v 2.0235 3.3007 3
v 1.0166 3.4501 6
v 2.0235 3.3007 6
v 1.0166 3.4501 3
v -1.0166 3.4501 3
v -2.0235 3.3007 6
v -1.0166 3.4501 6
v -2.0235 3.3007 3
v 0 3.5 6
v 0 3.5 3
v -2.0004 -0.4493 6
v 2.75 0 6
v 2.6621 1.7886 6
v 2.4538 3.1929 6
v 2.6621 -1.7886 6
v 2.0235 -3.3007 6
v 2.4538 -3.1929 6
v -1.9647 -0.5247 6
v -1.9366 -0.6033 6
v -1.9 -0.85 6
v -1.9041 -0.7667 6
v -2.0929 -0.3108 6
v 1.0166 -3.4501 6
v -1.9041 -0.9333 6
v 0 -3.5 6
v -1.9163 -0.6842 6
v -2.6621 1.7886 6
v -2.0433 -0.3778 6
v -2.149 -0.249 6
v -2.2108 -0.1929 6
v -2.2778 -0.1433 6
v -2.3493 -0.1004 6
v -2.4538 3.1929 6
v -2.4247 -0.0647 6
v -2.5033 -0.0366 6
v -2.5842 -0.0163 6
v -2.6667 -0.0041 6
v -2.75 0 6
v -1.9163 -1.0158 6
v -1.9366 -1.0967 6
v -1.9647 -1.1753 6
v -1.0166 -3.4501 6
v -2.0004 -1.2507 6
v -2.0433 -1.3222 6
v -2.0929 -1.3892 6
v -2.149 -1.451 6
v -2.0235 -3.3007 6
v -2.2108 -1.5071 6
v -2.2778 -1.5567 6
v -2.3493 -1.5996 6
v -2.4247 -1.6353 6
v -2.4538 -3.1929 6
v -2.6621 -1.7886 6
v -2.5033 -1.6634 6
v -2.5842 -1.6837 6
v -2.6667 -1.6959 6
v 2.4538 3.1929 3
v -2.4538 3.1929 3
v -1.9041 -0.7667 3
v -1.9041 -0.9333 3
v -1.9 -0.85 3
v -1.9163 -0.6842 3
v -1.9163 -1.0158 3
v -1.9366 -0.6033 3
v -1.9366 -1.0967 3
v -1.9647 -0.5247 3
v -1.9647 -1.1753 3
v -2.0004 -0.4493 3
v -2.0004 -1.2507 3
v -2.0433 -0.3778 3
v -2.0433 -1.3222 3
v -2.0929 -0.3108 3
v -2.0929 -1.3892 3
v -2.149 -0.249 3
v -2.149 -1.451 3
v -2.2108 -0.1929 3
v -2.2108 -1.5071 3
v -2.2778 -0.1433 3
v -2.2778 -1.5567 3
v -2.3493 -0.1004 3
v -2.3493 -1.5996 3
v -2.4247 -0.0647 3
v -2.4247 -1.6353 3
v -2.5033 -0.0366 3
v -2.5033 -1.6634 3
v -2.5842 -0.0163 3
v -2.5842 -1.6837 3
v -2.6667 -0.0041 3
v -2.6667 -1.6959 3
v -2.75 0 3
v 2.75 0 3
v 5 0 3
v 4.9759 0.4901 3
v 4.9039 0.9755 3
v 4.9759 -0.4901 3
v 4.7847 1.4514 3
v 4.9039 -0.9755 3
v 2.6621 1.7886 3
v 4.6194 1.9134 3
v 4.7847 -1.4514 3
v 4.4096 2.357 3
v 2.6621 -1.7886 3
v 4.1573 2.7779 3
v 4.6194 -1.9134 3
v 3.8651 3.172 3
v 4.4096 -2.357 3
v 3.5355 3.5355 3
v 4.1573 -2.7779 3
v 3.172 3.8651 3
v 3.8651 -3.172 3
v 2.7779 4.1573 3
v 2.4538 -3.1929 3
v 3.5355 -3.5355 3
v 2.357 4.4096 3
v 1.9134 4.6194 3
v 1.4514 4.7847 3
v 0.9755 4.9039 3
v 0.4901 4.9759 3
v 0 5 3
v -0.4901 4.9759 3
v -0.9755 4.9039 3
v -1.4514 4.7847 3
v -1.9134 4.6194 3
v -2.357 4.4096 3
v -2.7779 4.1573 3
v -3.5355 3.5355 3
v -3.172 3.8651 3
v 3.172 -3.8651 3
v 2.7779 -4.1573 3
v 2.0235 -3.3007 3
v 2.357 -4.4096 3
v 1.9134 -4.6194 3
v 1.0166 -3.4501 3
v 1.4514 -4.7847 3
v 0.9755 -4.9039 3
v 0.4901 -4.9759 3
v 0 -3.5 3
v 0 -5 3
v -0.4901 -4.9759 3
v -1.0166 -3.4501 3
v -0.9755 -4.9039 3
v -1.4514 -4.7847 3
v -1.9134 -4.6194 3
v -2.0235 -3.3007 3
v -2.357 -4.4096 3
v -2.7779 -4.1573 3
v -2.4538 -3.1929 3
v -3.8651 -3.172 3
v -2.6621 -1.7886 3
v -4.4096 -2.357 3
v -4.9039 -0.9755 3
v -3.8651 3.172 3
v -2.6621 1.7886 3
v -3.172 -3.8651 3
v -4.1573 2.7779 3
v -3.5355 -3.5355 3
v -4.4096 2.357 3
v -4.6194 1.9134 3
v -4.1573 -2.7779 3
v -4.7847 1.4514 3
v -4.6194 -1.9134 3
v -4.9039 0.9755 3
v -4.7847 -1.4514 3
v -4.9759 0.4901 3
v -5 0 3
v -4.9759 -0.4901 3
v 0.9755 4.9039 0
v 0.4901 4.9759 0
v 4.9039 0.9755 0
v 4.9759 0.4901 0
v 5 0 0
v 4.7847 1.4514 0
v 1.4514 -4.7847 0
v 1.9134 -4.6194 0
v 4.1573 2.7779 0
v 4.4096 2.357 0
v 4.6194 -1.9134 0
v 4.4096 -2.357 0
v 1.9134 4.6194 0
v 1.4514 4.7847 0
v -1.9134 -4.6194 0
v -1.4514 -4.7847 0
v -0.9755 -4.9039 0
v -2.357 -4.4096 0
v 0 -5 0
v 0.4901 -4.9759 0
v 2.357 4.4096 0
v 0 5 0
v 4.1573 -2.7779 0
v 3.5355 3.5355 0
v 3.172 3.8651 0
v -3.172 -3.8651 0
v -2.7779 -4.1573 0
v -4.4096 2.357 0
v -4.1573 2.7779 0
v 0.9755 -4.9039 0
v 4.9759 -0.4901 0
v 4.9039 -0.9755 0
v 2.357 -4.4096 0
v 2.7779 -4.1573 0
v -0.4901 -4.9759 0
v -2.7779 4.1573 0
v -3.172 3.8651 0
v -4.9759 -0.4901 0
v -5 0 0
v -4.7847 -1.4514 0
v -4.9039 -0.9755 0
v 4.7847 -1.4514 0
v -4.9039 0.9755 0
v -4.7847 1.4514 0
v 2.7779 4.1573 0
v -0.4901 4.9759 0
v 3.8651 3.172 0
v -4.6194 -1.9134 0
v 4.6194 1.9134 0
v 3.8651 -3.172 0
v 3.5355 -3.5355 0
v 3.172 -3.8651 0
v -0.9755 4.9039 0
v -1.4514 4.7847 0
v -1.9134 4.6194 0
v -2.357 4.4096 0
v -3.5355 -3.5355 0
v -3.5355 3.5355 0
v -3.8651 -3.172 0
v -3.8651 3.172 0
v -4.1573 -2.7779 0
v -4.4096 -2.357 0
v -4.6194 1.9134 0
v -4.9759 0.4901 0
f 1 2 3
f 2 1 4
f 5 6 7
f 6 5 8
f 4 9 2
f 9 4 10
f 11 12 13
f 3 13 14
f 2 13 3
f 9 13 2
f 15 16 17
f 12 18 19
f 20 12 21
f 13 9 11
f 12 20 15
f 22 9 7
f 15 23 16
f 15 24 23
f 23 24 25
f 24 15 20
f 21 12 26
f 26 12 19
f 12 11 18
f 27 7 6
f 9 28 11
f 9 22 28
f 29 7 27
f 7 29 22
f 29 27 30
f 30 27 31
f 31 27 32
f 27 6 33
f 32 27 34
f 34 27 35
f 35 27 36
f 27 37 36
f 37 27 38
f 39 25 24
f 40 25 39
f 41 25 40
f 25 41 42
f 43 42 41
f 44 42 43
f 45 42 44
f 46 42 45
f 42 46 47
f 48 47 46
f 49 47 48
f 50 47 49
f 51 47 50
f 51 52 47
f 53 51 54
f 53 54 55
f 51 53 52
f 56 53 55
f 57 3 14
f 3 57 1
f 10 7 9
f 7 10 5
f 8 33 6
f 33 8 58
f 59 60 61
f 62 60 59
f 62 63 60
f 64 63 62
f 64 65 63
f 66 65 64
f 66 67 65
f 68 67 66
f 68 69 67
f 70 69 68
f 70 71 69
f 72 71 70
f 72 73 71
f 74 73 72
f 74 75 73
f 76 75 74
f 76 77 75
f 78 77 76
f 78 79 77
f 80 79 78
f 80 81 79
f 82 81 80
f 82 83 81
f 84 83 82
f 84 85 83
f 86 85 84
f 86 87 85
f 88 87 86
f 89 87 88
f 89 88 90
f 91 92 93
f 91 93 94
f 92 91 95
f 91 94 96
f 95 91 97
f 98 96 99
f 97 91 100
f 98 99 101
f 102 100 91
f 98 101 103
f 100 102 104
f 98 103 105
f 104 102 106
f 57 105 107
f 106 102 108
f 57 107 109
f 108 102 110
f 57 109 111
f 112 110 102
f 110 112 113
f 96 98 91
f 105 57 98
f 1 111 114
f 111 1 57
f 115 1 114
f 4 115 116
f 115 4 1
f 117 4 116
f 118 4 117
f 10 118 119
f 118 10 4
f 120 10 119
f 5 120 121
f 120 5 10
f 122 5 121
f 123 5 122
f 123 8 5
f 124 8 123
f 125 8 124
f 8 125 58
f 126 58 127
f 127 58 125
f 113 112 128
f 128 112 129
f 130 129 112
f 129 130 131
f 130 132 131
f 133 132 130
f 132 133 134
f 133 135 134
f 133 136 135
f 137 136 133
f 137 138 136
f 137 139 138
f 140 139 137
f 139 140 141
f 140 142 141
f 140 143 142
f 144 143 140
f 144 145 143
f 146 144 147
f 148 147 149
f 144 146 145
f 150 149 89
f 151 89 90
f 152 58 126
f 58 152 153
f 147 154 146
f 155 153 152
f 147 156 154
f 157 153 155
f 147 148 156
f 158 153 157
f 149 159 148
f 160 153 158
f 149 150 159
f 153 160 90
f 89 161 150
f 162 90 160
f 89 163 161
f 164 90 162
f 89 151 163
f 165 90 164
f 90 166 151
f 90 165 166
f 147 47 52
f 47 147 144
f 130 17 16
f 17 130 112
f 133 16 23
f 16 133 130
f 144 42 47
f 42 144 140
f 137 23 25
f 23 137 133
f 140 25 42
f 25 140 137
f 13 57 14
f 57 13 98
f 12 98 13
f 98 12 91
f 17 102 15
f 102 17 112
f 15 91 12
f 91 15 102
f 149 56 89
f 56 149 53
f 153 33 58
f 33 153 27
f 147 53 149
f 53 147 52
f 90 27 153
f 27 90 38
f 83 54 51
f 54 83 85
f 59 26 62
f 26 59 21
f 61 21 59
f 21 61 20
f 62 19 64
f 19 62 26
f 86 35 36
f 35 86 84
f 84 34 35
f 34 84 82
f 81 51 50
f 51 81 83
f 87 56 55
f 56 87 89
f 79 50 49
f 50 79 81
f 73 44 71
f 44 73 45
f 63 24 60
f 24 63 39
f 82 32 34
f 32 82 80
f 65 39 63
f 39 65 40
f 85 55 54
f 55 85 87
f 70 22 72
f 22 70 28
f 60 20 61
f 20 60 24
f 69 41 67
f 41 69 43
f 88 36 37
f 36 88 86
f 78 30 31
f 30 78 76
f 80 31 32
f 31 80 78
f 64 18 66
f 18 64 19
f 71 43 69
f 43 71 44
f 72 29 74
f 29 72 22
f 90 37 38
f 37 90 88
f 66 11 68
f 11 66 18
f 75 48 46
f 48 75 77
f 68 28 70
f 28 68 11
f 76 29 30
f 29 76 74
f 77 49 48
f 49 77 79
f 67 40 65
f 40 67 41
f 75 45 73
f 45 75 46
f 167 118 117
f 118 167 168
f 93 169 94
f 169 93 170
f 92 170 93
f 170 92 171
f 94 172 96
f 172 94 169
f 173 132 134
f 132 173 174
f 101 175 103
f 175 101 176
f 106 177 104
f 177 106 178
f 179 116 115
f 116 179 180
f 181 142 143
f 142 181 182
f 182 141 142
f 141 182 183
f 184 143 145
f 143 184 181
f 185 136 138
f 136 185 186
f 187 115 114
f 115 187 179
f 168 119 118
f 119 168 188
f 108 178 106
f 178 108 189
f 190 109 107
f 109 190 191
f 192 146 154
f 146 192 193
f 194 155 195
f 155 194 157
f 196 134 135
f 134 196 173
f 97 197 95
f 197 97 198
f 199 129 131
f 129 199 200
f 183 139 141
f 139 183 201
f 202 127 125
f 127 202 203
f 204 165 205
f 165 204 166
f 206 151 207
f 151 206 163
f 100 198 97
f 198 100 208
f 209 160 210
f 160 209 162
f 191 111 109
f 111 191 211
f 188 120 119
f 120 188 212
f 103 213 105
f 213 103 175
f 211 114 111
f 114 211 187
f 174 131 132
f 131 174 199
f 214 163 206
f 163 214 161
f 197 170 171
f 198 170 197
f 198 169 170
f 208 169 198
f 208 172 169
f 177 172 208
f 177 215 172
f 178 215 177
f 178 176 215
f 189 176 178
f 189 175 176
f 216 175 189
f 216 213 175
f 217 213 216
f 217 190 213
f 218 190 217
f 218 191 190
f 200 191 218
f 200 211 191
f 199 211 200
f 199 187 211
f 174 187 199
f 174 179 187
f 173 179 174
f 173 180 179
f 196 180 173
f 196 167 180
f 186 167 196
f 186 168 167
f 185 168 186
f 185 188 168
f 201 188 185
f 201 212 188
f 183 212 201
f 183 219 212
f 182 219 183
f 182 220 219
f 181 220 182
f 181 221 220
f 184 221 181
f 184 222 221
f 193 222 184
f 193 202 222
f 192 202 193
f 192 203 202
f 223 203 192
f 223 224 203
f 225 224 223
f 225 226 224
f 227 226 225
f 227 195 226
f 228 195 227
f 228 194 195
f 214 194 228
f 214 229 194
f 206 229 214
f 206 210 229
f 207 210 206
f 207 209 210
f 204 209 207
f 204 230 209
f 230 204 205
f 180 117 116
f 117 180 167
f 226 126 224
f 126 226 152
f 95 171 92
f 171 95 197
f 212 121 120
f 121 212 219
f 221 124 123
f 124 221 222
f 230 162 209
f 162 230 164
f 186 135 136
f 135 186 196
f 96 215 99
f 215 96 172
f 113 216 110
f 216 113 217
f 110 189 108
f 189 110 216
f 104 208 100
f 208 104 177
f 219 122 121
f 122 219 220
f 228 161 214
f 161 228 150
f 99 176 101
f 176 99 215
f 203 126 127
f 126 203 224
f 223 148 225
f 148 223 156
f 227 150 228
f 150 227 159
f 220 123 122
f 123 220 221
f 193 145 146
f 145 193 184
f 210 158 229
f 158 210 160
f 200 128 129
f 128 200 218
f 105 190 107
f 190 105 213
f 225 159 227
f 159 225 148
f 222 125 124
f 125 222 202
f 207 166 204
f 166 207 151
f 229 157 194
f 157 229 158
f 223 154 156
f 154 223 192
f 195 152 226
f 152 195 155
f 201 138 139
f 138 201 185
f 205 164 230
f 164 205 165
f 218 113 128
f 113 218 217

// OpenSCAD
$fn = 64;

HOLDER_L = 7;
HOLDER_W = 5.5;
DELTA = 0.5;

SLOT_R = 0.85;
SLOT_DL = -SLOT_R;
SLOT_DW = -HOLDER_W/2;

HOLDER_H = 3;
BASE_H = 3;

function hypotenuse(l1, l2) = sqrt((l1*l1)+(l2*l2));
function leg(h, l) = sqrt((h*h)-(l*l));

module holder() {
    L2_MAX = HOLDER_L / 2;
    L2_MIN = L2_MAX - DELTA;
    W2_MAX = HOLDER_W / 2;
    W2_MIN = W2_MAX - DELTA;

    OUT_SMALL = hypotenuse(W2_MIN, DELTA);
    R_SMALL = OUT_SMALL * W2_MIN / DELTA;
    IN_SMALL = leg(R_SMALL, W2_MIN);

    OUT_BIG = hypotenuse(L2_MIN, DELTA);
    R_BIG = OUT_BIG * L2_MIN / DELTA;
    IN_BIG = leg(R_BIG, L2_MIN);

    C_SMALL = L2_MAX - R_SMALL;
    C_BIG = W2_MAX - R_BIG;

    difference() {
        intersection() {
            translate([0, +C_SMALL, BASE_H + (HOLDER_H / 2)]) cylinder(r=R_SMALL, h=HOLDER_H, center=true);
            translate([0, -C_SMALL, BASE_H + (HOLDER_H / 2)]) cylinder(r=R_SMALL, h=HOLDER_H, center=true);
            translate([+C_BIG, 0, BASE_H + (HOLDER_H / 2)]) cylinder(r=R_BIG, h=HOLDER_H, center=true);
            translate([-C_BIG, 0, BASE_H + (HOLDER_H / 2)]) cylinder(r=R_BIG, h=HOLDER_H, center=true);
        }
        translate([SLOT_DW, SLOT_DL, BASE_H + (HOLDER_H / 2)]) cylinder(r=SLOT_R, h=HOLDER_H*2, center=true);
    }
}

holder();
translate([0, 0, BASE_H / 2]) cylinder(r=5, h=BASE_H, center=true);
